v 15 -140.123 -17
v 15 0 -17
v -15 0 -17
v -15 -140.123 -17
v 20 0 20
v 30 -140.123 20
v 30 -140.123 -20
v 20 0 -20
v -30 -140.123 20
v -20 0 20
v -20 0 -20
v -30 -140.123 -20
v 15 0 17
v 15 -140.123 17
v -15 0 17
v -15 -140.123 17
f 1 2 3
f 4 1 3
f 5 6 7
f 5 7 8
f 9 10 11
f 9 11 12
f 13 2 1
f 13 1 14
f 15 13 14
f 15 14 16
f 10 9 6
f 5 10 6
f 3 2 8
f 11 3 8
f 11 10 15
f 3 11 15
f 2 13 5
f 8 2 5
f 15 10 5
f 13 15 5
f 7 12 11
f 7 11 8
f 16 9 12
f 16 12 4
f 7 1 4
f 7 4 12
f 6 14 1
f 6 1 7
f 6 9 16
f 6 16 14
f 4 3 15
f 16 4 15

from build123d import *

# Parameters (mm, degrees)
F0_W     = 1
F0_H     = 30
F0_W_2   = 38
F0_H_2   = 1.332180649
F1_DEPTH = 140
F2_W     = 40
F2_H     = 0.123128891
F3_DEPTH = 40
F4_W     = 30
F4_H     = 34
F5_DEPTH = 140.123128891


with BuildPart() as f1:
    # F0 (on Front) → F1 (new body)
    with BuildSketch(Plane.XZ):
        Polygon((-19.5, 15), (-20, 15), (-20, -11.8550653383), (-20, -15), (-19.5, -15), (-19.5, -5.2632528394), (-19.5, -3.2632528394), (-19.5, 2.7367471606), (-19.5, 4.7367471606), align=None)
        Polygon((-19, -15), (-19, 15), (-19.5, 15), (-19.5, 4.7367471606), (-19.5, 2.7367471606), (-19.5, -3.2632528394), (-19.5, -5.2632528394), (-19.5, -15), align=None)
        Polygon((-17.5, -17.5), (-20, -15), (-20, -20), (-15, -20), align=None)
        Polygon((-15, -15), (-19, -15), (-19.5, -15), (-20, -15), (-17.5, -17.5), (-16.767766953, -16.767766953), align=None)
        Polygon((-15, -17.5), (-15, -15), (-16.767766953, -16.767766953), (-17.5, -17.5), (-15, -20), align=None)
        with BuildLine():
            Line((15, -15), (-15, -15))
            Line((-15, -15), (-15, -17.5))
            Line((-15, -17.5), (-11.391207267, -17.5))
            ThreePointArc((-11.391207267, -17.5), (-10.2485464886, -16.3573392216), (-9.1058857102, -17.5))
            Line((-9.1058857102, -17.5), (-7.9234171988, -17.5))
            ThreePointArc((-7.9234171988, -17.5), (-5.948765669, -15.5253484702), (-3.9741141393, -17.5))
            Line((-3.9741141393, -17.5), (3.9741141393, -17.5))
            ThreePointArc((3.9741141393, -17.5), (5.948765669, -15.5253484702), (7.9234171988, -17.5))
            Line((7.9234171988, -17.5), (9.1058857102, -17.5))
            ThreePointArc((9.1058857102, -17.5), (10.2485464886, -16.3573392216), (11.391207267, -17.5))
            Line((11.391207267, -17.5), (15, -17.5))
            Line((15, -17.5), (15, -15))
        make_face()
        with BuildLine():
            Line((-15, -20), (15, -20))
            Line((15, -20), (15, -17.5))
            Line((15, -17.5), (11.391207267, -17.5))
            ThreePointArc((11.391207267, -17.5), (10.2485464886, -18.6426607784), (9.1058857102, -17.5))
            Line((9.1058857102, -17.5), (7.9234171988, -17.5))
            ThreePointArc((7.9234171988, -17.5), (5.948765669, -19.4746515298), (3.9741141393, -17.5))
            Line((3.9741141393, -17.5), (-3.9741141393, -17.5))
            ThreePointArc((-3.9741141393, -17.5), (-5.948765669, -19.4746515298), (-7.9234171988, -17.5))
            Line((-7.9234171988, -17.5), (-9.1058857102, -17.5))
            ThreePointArc((-9.1058857102, -17.5), (-10.2485464886, -18.6426607784), (-11.391207267, -17.5))
            Line((-11.391207267, -17.5), (-15, -17.5))
            Line((-15, -17.5), (-15, -20))
        make_face()
        with BuildLine():
            Line((-9.1058857102, -17.5), (-11.391207267, -17.5))
            ThreePointArc((-11.391207267, -17.5), (-10.2485464886, -18.6426607784), (-9.1058857102, -17.5))
        make_face()
        with BuildLine():
            ThreePointArc((-9.1058857102, -17.5), (-10.2485464886, -16.3573392216), (-11.391207267, -17.5))
            Line((-11.391207267, -17.5), (-9.1058857102, -17.5))
        make_face()
        with BuildLine():
            ThreePointArc((-3.9741141393, -17.5), (-5.948765669, -15.5253484702), (-7.9234171988, -17.5))
            Line((-7.9234171988, -17.5), (-3.9741141393, -17.5))
        make_face()
        with BuildLine():
            Line((-3.9741141393, -17.5), (-7.9234171988, -17.5))
            ThreePointArc((-7.9234171988, -17.5), (-5.948765669, -19.4746515298), (-3.9741141393, -17.5))
        make_face()
        with BuildLine():
            Line((3.9741141393, -17.5), (7.9234171988, -17.5))
            ThreePointArc((7.9234171988, -17.5), (5.948765669, -15.5253484702), (3.9741141393, -17.5))
        make_face()
        with BuildLine():
            ThreePointArc((3.9741141393, -17.5), (5.948765669, -19.4746515298), (7.9234171988, -17.5))
            Line((7.9234171988, -17.5), (3.9741141393, -17.5))
        make_face()
        Polygon((19, 17.5), (-19, 17.5), (-19, 15), (-19, -15), (-15, -15), (15, -15), (19, -15), (19, 15), align=None)
        with BuildLine():
            ThreePointArc((9.1058857102, -17.5), (10.2485464886, -18.6426607784), (11.391207267, -17.5))
            Line((11.391207267, -17.5), (9.1058857102, -17.5))
        make_face()
        with BuildLine():
            Line((9.1058857102, -17.5), (11.391207267, -17.5))
            ThreePointArc((11.391207267, -17.5), (10.2485464886, -16.3573392216), (9.1058857102, -17.5))
        make_face()
        Polygon((20, -20), (20, -15), (19, -15), (15, -15), (15, -17.5), (15, -20), align=None)
        with Locations((19.5, 0)):
            Rectangle(F0_W, F0_H)
        Polygon((-19, 18.832180649), (-19, 20), (-20, 20), (-20, 15), (-19.5, 15), (-19, 15), (-19, 17.5), align=None)
        with Locations((0, 18.1660903245)):
            Rectangle(F0_W_2, F0_H_2)
        Polygon((15, 20), (-15, 20), (-19, 20), (-19, 18.832180649), (19, 18.832180649), (19, 20), align=None)
        Polygon((20, 20), (19, 20), (19, 18.832180649), (19, 17.5), (19, 15), (20, 15), align=None)
    extrude(amount=F1_DEPTH)

    # F2 (on face) → F3 (join, through all)
    with BuildSketch(Plane.XY.offset(20)):
        with Locations((0, -140.0615644455)):
            Rectangle(F2_W, F2_H)
        Polygon((-20, -140.123128891), (-20, -140), (-20, 0), (-30, -140.123128891), align=None)
        Polygon((20, 0), (20, -140), (20, -140.123128891), (30, -140.123128891), align=None)
    extrude(amount=-F3_DEPTH)

    # F4 (on face) → F5 (cut, through all)
    with BuildSketch(Plane(origin=(0, 0, 0), x_dir=(-1, 0, 0), z_dir=(0, 1, 0))):
        Rectangle(F4_W, F4_H)
    extrude(amount=-F5_DEPTH, mode=Mode.SUBTRACT)


solid = f1.part
